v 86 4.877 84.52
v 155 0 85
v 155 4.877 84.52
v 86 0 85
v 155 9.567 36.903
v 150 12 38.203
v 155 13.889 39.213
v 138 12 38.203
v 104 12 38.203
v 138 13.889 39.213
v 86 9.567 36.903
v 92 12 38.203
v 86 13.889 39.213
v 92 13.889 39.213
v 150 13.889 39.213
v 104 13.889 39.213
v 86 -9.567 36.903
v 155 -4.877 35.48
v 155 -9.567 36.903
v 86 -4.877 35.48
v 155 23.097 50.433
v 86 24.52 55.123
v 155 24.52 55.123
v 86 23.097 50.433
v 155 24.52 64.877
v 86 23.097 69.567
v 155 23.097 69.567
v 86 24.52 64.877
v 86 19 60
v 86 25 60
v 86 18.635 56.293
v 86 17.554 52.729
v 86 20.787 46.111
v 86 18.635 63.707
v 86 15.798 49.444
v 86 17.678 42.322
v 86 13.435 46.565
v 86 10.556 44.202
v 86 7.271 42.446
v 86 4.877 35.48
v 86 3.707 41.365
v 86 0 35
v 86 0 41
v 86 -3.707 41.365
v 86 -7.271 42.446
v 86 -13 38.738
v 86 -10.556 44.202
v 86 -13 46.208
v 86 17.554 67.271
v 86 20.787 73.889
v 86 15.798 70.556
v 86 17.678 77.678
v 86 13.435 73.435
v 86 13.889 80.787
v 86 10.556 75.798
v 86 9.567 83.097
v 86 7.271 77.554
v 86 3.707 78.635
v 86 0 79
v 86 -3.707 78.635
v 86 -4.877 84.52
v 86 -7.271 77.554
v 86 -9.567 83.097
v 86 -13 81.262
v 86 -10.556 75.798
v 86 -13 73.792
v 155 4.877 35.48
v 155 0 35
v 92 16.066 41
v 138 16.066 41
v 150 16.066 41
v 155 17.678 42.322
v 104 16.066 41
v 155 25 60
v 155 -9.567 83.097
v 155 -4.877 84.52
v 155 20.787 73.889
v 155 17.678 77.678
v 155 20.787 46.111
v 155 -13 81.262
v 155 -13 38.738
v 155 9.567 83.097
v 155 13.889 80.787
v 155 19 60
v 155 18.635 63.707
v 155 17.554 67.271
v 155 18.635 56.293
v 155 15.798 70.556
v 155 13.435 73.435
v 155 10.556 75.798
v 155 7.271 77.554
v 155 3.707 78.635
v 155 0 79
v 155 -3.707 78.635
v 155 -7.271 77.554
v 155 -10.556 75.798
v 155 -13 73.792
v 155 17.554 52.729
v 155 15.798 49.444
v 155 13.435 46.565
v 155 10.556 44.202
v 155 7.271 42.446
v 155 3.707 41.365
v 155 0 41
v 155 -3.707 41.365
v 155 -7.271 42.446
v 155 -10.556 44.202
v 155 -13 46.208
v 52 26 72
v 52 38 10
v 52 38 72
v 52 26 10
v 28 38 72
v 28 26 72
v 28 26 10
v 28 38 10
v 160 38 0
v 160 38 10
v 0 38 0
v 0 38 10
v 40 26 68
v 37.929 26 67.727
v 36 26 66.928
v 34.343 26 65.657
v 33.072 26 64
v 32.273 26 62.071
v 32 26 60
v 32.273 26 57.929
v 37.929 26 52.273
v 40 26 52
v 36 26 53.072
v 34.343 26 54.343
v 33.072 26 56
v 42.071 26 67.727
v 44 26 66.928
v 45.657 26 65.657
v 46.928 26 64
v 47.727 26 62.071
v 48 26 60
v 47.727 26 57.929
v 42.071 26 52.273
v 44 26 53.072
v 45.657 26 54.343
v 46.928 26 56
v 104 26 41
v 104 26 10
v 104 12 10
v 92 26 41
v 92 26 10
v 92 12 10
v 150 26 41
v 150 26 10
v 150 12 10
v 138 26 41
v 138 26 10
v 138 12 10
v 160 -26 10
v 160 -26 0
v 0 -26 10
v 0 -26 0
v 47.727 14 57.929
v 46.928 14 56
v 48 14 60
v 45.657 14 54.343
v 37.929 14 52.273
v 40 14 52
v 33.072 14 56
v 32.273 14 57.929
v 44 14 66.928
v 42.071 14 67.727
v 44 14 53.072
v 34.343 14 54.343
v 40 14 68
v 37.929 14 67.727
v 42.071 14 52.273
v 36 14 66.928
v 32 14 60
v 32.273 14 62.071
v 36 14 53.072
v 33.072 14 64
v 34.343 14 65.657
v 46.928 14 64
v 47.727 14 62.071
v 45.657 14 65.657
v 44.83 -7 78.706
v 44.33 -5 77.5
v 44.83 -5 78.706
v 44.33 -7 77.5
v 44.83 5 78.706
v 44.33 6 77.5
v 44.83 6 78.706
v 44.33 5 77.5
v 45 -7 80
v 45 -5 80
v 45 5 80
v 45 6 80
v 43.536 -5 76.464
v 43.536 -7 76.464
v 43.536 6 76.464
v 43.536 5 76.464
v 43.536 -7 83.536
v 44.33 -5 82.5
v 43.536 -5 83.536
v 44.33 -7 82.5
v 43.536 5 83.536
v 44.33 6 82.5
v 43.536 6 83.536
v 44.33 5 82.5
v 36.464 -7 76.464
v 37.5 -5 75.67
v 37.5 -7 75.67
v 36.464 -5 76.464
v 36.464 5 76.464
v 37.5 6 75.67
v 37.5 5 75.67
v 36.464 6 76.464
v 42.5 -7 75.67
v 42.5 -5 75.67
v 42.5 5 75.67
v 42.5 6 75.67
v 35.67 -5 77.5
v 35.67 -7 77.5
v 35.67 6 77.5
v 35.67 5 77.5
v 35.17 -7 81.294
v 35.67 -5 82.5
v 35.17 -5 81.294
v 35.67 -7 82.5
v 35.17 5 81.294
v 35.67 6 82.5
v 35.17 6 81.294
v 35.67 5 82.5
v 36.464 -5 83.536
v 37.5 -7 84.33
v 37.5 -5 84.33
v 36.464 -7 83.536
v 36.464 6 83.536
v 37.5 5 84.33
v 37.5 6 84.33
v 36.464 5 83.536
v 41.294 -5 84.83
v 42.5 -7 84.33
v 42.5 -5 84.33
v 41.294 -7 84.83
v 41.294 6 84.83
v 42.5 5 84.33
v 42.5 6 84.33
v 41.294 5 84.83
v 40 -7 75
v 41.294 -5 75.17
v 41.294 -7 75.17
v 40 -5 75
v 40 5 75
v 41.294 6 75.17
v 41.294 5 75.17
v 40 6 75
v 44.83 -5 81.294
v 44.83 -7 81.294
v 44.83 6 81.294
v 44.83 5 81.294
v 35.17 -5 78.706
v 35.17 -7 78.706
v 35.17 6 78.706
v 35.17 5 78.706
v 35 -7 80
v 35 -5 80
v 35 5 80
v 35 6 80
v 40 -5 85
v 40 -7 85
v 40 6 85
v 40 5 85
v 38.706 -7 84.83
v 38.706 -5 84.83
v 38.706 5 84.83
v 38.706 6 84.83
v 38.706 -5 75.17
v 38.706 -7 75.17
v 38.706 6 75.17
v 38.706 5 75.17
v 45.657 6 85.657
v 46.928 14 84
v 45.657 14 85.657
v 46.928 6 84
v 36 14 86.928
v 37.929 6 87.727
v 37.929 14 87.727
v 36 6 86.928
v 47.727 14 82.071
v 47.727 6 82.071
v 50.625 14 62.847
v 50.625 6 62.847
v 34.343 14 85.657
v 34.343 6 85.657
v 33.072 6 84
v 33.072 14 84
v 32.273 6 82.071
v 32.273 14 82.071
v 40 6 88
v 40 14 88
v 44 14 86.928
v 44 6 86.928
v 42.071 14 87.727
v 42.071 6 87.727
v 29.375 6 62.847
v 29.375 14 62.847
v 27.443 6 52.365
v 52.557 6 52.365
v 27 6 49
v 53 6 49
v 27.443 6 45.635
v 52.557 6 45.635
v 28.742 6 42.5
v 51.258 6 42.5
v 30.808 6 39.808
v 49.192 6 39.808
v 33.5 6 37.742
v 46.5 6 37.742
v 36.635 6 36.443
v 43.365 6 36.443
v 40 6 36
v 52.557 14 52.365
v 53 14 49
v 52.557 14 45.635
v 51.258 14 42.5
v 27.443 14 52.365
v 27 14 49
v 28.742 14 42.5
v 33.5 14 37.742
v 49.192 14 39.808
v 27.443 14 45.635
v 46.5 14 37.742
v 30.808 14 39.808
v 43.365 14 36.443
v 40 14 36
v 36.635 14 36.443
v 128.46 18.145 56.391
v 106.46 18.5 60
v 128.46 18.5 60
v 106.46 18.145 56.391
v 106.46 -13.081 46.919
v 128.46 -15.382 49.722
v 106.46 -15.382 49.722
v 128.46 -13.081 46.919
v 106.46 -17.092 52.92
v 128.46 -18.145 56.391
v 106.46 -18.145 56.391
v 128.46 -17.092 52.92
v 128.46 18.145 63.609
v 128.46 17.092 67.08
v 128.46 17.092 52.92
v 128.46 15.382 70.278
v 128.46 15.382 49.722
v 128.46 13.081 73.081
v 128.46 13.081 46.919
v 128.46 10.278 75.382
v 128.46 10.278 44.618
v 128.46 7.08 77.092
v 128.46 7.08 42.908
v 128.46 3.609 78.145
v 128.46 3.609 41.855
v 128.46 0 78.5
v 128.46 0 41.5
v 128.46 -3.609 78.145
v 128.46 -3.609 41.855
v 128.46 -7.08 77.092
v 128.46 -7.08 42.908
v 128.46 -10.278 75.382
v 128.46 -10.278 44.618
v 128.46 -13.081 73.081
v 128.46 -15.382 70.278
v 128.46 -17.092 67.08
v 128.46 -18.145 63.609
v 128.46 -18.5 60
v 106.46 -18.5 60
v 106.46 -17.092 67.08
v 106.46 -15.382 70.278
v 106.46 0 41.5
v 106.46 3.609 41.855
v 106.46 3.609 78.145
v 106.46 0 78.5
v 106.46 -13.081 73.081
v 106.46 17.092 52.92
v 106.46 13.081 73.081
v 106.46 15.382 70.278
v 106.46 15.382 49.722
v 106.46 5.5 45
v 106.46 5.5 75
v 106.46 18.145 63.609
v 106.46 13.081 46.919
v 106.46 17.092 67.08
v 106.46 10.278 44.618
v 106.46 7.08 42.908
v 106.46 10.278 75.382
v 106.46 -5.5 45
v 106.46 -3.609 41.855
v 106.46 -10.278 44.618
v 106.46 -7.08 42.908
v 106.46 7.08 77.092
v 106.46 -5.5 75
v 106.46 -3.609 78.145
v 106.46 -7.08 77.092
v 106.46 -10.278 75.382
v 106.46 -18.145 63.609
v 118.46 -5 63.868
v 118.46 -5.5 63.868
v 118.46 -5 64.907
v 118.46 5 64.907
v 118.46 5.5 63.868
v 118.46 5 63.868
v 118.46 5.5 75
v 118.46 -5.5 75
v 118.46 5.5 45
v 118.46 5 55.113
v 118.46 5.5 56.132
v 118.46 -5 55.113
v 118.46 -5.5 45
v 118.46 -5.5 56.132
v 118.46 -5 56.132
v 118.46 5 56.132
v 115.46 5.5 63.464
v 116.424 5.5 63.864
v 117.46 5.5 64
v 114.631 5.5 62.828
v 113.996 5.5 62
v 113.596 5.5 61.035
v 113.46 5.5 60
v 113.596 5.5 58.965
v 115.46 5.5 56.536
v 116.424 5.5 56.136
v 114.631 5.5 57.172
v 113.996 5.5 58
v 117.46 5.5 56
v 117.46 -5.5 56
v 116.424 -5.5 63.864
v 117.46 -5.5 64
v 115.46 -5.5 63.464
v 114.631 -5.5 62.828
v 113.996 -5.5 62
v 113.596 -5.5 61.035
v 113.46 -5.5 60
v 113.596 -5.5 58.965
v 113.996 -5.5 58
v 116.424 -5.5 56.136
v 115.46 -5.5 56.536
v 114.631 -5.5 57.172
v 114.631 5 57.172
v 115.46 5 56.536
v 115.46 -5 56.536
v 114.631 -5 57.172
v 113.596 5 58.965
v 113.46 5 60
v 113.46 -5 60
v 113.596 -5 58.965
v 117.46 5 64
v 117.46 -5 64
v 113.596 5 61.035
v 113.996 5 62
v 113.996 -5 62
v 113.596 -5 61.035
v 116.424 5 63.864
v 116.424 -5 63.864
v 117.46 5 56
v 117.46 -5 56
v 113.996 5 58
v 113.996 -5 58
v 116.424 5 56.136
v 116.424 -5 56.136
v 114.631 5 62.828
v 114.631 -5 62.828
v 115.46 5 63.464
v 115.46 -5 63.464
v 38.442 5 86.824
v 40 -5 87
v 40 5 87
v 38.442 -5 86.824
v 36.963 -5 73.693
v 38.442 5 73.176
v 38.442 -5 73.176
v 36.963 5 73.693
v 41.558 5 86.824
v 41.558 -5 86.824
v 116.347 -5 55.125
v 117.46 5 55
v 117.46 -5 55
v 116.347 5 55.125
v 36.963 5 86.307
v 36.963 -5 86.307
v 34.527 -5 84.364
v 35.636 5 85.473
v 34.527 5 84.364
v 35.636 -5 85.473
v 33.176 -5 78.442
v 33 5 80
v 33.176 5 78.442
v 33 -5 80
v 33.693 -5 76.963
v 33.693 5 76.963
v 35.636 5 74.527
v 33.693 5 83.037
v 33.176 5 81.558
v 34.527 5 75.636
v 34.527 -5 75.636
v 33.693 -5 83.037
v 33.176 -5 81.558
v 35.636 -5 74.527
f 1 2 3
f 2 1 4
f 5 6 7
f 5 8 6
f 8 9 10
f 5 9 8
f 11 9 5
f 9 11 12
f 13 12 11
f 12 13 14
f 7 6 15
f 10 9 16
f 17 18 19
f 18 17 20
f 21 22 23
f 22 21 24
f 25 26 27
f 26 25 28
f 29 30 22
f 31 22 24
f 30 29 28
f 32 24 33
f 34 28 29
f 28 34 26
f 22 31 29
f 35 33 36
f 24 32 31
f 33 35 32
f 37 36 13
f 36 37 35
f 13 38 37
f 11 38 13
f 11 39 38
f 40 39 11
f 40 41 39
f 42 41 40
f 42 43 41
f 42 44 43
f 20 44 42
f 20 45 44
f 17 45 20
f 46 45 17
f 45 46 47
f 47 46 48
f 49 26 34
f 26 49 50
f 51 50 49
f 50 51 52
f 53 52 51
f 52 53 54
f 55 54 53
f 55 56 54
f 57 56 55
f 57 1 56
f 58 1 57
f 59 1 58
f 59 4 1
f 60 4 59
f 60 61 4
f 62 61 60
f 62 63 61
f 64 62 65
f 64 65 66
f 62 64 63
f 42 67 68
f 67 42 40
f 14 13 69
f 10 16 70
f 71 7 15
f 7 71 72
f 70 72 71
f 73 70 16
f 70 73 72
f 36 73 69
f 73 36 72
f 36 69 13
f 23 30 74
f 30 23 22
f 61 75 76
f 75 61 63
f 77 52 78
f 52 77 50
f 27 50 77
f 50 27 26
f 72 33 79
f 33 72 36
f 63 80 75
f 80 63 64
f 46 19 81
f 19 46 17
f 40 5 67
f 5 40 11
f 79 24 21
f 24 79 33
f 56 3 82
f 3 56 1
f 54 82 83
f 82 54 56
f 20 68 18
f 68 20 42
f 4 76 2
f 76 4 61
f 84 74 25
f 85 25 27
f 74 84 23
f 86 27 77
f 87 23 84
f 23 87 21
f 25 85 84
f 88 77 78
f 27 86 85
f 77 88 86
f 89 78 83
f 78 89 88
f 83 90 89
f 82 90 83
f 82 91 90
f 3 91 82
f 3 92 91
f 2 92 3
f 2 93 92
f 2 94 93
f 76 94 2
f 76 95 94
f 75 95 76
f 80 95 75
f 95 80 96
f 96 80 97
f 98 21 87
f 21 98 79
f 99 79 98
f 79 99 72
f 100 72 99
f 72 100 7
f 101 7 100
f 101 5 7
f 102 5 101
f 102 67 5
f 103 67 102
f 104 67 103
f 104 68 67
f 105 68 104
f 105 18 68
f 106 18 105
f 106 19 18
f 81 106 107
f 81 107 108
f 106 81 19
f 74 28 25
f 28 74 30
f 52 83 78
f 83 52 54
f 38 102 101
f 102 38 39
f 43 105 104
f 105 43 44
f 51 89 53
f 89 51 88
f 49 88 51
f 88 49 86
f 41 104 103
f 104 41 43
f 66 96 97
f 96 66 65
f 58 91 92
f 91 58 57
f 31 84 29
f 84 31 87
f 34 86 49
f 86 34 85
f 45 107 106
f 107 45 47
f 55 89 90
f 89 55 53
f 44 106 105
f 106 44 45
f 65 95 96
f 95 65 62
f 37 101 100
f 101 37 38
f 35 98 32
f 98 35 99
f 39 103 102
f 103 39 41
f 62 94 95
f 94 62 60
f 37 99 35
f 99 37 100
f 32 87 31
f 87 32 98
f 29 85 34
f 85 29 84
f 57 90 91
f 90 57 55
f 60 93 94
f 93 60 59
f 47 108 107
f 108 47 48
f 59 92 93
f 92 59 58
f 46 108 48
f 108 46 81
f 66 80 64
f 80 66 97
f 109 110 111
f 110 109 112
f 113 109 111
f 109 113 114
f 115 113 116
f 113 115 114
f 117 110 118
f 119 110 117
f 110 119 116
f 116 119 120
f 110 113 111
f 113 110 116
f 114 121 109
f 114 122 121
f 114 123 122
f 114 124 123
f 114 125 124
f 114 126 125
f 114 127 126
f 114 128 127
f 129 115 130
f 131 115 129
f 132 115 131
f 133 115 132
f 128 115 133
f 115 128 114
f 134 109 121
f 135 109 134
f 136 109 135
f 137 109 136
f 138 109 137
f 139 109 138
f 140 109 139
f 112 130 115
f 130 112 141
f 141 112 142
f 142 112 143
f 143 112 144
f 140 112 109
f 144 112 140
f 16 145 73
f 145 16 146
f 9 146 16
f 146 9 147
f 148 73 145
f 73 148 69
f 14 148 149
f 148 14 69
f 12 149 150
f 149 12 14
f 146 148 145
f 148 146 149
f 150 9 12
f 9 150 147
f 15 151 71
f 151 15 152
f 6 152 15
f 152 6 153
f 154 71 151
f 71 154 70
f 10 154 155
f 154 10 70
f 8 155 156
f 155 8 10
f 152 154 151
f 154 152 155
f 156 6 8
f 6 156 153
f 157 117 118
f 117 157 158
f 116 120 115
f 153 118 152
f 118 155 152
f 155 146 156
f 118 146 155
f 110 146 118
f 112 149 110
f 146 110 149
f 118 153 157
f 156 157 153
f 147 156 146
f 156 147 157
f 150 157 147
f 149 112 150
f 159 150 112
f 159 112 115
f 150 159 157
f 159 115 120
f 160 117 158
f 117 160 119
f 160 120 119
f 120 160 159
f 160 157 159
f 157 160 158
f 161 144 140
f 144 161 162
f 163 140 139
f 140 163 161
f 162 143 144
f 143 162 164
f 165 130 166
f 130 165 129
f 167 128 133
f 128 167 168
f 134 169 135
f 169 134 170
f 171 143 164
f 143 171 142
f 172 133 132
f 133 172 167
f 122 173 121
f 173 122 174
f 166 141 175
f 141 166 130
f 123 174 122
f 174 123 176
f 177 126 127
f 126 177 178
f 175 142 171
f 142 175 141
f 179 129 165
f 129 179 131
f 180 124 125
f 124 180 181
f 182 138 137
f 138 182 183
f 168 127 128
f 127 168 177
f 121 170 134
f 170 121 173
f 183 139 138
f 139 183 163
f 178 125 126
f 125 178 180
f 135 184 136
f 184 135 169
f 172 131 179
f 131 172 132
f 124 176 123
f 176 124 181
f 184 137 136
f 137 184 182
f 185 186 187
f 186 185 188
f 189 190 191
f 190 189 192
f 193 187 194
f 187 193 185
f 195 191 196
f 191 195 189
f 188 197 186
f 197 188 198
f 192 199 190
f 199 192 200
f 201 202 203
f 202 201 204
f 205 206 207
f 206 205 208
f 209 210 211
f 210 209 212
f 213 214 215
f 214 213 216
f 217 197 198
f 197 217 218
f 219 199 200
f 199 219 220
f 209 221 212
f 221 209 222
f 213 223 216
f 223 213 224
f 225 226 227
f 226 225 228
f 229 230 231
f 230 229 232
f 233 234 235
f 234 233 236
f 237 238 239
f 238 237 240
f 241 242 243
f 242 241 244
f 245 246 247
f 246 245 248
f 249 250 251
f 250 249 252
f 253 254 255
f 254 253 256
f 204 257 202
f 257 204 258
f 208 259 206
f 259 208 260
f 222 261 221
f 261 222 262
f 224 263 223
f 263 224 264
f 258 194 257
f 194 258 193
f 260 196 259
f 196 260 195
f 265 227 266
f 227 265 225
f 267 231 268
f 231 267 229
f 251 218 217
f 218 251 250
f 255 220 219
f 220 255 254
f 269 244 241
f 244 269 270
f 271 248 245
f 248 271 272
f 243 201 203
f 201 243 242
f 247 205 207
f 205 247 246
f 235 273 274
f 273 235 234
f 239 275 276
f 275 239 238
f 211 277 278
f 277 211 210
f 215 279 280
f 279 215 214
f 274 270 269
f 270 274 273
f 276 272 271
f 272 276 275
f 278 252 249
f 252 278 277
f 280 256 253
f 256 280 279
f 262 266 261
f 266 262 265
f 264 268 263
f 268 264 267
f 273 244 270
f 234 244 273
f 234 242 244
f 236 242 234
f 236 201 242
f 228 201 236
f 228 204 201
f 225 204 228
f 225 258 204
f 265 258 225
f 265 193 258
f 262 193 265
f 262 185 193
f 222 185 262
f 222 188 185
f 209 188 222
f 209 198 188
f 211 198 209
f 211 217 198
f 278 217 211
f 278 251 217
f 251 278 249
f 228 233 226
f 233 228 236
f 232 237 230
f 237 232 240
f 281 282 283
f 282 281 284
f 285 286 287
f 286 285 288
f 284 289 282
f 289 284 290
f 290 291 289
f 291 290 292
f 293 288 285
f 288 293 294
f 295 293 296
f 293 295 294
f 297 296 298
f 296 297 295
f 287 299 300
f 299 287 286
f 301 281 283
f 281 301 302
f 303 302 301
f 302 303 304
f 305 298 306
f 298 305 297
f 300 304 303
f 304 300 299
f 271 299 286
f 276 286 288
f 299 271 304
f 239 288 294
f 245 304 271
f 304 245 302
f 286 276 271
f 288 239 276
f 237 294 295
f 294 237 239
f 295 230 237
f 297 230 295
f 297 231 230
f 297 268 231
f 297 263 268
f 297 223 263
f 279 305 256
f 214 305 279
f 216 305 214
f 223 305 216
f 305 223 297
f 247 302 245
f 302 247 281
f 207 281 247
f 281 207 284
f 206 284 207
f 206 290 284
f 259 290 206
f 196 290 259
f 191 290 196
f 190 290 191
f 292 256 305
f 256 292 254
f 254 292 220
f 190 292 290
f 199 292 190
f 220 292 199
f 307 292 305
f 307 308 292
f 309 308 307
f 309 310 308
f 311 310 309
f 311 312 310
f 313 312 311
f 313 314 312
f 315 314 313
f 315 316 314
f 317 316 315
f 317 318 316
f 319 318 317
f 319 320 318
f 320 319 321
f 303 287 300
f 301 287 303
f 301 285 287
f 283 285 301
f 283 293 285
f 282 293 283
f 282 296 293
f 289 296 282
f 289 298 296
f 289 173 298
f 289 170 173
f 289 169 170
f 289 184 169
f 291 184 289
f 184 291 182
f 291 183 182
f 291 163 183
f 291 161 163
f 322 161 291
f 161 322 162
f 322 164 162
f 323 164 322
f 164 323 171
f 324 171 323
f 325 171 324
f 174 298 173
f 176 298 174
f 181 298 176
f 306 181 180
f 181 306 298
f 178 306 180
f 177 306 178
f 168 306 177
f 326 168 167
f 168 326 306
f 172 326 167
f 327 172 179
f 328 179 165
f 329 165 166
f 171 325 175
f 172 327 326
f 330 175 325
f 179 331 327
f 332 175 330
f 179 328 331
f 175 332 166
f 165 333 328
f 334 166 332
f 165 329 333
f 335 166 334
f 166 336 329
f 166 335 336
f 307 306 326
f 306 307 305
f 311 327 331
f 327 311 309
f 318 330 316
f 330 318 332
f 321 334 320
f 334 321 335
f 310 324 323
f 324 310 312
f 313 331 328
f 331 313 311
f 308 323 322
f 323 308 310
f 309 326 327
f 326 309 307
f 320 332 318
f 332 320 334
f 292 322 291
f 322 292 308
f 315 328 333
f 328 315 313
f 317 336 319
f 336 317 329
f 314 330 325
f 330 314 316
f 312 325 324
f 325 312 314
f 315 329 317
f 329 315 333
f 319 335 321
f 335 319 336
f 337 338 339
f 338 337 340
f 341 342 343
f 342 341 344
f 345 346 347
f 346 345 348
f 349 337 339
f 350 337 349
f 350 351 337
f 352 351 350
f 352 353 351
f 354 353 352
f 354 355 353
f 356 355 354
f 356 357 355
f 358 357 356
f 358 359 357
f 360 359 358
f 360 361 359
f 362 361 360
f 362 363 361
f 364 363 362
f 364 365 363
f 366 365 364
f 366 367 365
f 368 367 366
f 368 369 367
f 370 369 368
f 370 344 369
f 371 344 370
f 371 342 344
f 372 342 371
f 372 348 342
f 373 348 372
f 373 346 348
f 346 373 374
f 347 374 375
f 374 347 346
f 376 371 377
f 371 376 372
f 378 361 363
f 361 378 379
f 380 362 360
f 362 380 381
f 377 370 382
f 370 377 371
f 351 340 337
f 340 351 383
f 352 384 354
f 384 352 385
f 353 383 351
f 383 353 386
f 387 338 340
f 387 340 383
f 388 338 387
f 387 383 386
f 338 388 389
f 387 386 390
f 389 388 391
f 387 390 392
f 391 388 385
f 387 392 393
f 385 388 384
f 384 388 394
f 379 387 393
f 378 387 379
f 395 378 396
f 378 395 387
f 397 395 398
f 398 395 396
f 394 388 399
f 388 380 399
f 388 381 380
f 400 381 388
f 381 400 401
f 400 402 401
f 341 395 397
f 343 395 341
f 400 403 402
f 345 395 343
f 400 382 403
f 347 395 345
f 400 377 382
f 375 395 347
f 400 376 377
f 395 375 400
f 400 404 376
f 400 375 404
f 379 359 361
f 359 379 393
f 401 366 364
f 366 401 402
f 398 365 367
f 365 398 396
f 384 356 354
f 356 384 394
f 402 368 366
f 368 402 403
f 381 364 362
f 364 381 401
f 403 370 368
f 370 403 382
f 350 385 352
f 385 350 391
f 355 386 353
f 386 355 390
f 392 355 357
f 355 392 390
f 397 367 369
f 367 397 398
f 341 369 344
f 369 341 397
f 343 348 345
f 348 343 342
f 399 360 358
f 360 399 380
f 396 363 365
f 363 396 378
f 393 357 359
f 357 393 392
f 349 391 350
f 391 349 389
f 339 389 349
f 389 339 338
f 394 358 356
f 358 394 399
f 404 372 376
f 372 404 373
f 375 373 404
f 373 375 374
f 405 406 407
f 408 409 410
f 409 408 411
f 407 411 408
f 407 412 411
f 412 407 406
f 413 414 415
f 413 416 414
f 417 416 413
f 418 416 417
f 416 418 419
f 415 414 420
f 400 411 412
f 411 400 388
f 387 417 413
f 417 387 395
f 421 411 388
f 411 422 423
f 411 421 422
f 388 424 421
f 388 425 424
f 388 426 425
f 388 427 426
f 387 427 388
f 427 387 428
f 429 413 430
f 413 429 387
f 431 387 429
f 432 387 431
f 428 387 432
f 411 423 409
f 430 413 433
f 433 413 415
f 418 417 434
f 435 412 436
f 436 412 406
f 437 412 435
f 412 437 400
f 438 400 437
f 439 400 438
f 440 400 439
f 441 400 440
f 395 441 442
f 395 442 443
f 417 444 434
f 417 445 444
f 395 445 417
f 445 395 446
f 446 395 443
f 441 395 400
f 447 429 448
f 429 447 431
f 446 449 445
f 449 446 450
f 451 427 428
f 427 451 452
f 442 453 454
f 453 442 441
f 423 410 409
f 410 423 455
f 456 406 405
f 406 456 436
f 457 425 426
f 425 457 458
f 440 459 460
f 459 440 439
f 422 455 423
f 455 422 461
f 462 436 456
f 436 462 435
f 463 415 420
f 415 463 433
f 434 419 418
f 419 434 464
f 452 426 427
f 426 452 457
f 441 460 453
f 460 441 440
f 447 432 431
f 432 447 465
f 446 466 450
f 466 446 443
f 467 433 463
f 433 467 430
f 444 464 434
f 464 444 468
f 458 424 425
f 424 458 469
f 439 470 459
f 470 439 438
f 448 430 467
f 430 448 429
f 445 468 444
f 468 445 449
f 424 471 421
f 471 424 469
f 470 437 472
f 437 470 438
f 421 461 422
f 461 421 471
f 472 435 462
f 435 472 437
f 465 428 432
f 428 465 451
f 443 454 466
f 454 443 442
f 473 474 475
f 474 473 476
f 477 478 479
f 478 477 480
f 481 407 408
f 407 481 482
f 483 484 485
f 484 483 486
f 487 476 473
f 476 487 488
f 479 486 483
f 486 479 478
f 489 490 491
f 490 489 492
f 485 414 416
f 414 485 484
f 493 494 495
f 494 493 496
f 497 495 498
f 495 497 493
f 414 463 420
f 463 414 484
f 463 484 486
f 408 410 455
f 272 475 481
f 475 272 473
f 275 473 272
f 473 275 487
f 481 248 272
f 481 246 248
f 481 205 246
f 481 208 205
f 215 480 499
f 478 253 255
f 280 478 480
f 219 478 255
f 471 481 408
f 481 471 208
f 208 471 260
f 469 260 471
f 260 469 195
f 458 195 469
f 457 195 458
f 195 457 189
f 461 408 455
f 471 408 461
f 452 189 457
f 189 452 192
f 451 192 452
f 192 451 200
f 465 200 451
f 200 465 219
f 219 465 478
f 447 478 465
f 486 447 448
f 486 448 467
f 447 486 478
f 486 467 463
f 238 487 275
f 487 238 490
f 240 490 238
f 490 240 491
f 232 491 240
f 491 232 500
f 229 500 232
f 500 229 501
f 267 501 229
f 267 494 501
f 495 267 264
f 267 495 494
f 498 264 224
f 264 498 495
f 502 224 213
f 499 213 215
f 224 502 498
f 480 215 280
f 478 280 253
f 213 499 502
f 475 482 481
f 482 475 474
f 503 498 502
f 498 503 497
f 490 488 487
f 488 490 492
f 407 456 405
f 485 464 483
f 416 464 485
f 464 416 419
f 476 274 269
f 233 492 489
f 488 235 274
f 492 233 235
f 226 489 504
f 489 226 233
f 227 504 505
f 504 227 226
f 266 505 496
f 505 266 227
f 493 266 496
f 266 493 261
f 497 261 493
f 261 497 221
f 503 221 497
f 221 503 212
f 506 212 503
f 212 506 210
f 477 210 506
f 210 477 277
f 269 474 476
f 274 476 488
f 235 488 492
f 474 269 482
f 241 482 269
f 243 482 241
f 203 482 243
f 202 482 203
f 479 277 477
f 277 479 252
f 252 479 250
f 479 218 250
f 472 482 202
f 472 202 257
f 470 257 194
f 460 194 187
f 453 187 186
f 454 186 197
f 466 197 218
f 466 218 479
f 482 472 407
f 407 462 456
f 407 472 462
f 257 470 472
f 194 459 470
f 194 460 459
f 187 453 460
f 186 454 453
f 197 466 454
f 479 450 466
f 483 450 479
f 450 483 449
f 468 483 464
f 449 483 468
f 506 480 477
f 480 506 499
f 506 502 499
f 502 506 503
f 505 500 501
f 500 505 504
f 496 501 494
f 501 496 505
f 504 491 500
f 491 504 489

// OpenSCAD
// A slider-crank: the linkage in every engine ever built.
//
// Three revolutes and a prismatic, closing a loop through a *sliding* joint
// rather than a fourth hinge. That is the whole difference from the four-bar,
// and it is what turns going round into going back and forth.
//
// It is also the tour's second answer to the same question the cam asks, reached
// the other way. The cam finds its follower's motion through a *contact* — two
// shapes and whatever room they leave each other. This finds the piston's motion
// through a *constraint* — a rod of a fixed length with its ends pinned. Both
// have a closed form, neither has it written down anywhere, and the two can be
// read against each other:
//
//     x(θ) = O + R·cosθ + √(L² − R²·sin²θ)
//
// What makes it worth plotting is the square root. Take it away — pretend the
// rod is infinitely long — and the piston is a pure cosine, symmetric, with the
// same time either side of mid-stroke. The real thing is not: the second term
// adds a harmonic at twice crank speed, so the piston spends *less* time in the
// outer half of its stroke than the inner, and is going faster at 90° after top
// centre than a cosine would have it. With R/L = 1/4 that is 5 mm on a 40 mm
// stroke, which is 12% and is the reason engines need balance shafts.
//
// Nothing here says any of that. It is four parts, four joints and a motor.

module part(name, fixed = false, density = undef, mass = undef,
            collider = undef, friction = undef, bounce = undef) { children(); }
module hinge(name, parts, at, axis, range) { }
module slider(name, parts, at, axis, range) { }
module drive(name, to, over, at, torque, speed) { }

STEEL = 0.0078;         // g/mm³
ALLOY = 0.0027;         // the piston, as a piston is
PIN   = [0, 1, 0];      // everything turns about y, so the engine is planar

DECK = 10;
O = [40, 0, 60];        // the crankshaft's axis
R = 20;                 // the throw — half the stroke
L = 80;                 // and the rod, centre to centre

// Drawn at 90° after top centre, which is mid-*angle* and emphatically not
// mid-stroke: the piston is 17.5 mm from one end of its travel and 22.5 from the
// other, and that asymmetry is the model.
CX  = O[0] + sqrt(L * L - R * R);
B   = [O[0], 0, O[2] + R];       // the crank pin, straight up at this angle
C   = [CX, 0, O[2]];             // and the gudgeon pin, on the bore's axis
TDC = O[0] + R + L;
BDC = O[0] - R + L;

BORE  = 19;             // the cylinder's inside radius
PISTON = 18.5;          // and the piston, half a millimetre under it
CYL = [86, 155];        // how far the cylinder runs in x

module along_x(at, r, len, sides = 32) {
    translate(at) rotate([0, 90, 0]) cylinder(h = len, r = r, $fn = sides);
}
module along_y(at, r, from, len, sides = 24) {
    translate([at[0], from, at[2]]) rotate([-90, 0, 0])
        cylinder(h = len, r = r, $fn = sides);
}

// ---- the frame -------------------------------------------------------------
// A bed, a main bearing for the crankshaft, and the cylinder — which is drawn
// sectioned, with the front of its wall cut away.
//
// That is not a liberty. A cylinder is a bore, and a bore that goes all the way
// round is opaque: the piston inside it is the one thing this model is about and
// a solid tube hides it completely. Cutting the front open is how every engine
// has ever been drawn, and it leaves the joint intact — the piston still runs in
// a bore, with a half-millimetre fit measurable all the way round the back.
//
// Nothing overlaps by nothing. Each solid sinks a millimetre into the one it
// stands on: exactly coplanar touching faces are the worst case an exact boolean
// kernel has, and this frame has two booleans in it already.
part("frame", fixed = true)
    color("slategray") {
        translate([0, -26, 0]) cube([160, 64, DECK]);

        color("dimgray") {
            // The main bearing, behind the crank's own web. +y is the far side
            // from the tour's camera, and everything structural lives there.
            translate([28, 26, DECK - 1]) cube([24, 12, 63]);

            difference() {
                along_x([CYL[0], 0, O[2]], BORE + 6, CYL[1] - CYL[0]);
                along_x([CYL[0] - 2, 0, O[2]], BORE, CYL[1] - CYL[0] + 4);
                // the section cut, taking the near wall away
                translate([CYL[0] - 2, -32, O[2] - 26])
                    cube([CYL[1] - CYL[0] + 4, 19, 52]);
            }
            // and two feet under it
            translate([92, 12, DECK - 1]) cube([12, 14, 32]);
            translate([138, 12, DECK - 1]) cube([12, 14, 32]);
        }
    }

// ---- the crankshaft --------------------------------------------------------
// A journal running back into that bearing, a web out to the throw, the crank
// pin itself, and a counterweight opposite. The counterweight is the one part
// here that does no work at all and is not decoration either: it is what an
// unbalanced 100 g of steel swinging on a 20 mm arm costs, and leaving it off
// shows up in the main bearing rather than in the motion.
part("crank", density = STEEL)
    color("indianred") {
        hull() {
            along_y(O, 11, 6, 8);
            along_y(B, 8, 6, 8);
        }
        hull() {
            along_y(O, 11, 6, 8);
            along_y([O[0], 0, O[2] - R * 0.55], 13, 6, 8);
        }
        color("firebrick") {
            along_y(O, 8, 13, 21);          // the journal, into its bearing
            along_y(B, 5, -7, 14);          // and the crank pin, through the rod
        }
    }
hinge("crank_pin", parts = ["crank", "frame"], at = O, axis = PIN);

// ---- the connecting rod ----------------------------------------------------
// Fat at the big end and thin at the little one, which is what a rod is and also
// exactly what its collider will be: the convex hull of two circles.
module rod(p, q, rp, rq, t) {
    hull() {
        translate([p[0], -t / 2, p[2]]) rotate([-90, 0, 0])
            cylinder(h = t, r = rp, $fn = 28);
        translate([q[0], -t / 2, q[2]]) rotate([-90, 0, 0])
            cylinder(h = t, r = rq, $fn = 28);
    }
}
part("conrod", density = STEEL)
    color("goldenrod") rod(B, C, 7, 5, 10);
hinge("big_end", parts = ["conrod", "crank"], at = B, axis = PIN);

// ---- the piston ------------------------------------------------------------
// Slotted up its back so the rod can reach the gudgeon pin. Drawn solid, the
// rod's little end is simply *inside* it — two solids in one place, which is the
// fault this tour keeps finding and which a mate hides every time, since the
// pair is joined and so excluded from the interference check.
//
// The slot costs nothing where it matters: a moving part's collider is its
// convex hull, so what runs in the bore is still the full cylinder.
part("piston", density = ALLOY, friction = 0.05)
    color("steelblue") {
        difference() {
            along_x([C[0] - 11, 0, O[2]], PISTON, 22);
            translate([C[0] - 12, -5.5, O[2] - 15]) cube([13, 11, 30]);
        }
        color("cadetblue") along_y(C, 4, -9, 18);
    }
hinge("little_end", parts = ["piston", "conrod"], at = C, axis = PIN);
slider("bore", parts = ["piston", "frame"], at = C, axis = [1, 0, 0],
       range = [BDC - CX, TDC - CX]);

// One input, and everything else is a consequence.
//
// The torque is not a guess. Nothing here is lifted very far, but the rod's big
// end carries 86 g of steel round a 20 mm circle and the piston is 54 g being
// turned round twice a revolution; the weight alone is about 17,000,000 at the
// crank, and a motor that cannot hold that stops being an input and starts being
// a thing the linkage swings. Twenty million holds 180°/s to within a degree.
drive("crank_pin", speed = 180, torque = 20000000);
